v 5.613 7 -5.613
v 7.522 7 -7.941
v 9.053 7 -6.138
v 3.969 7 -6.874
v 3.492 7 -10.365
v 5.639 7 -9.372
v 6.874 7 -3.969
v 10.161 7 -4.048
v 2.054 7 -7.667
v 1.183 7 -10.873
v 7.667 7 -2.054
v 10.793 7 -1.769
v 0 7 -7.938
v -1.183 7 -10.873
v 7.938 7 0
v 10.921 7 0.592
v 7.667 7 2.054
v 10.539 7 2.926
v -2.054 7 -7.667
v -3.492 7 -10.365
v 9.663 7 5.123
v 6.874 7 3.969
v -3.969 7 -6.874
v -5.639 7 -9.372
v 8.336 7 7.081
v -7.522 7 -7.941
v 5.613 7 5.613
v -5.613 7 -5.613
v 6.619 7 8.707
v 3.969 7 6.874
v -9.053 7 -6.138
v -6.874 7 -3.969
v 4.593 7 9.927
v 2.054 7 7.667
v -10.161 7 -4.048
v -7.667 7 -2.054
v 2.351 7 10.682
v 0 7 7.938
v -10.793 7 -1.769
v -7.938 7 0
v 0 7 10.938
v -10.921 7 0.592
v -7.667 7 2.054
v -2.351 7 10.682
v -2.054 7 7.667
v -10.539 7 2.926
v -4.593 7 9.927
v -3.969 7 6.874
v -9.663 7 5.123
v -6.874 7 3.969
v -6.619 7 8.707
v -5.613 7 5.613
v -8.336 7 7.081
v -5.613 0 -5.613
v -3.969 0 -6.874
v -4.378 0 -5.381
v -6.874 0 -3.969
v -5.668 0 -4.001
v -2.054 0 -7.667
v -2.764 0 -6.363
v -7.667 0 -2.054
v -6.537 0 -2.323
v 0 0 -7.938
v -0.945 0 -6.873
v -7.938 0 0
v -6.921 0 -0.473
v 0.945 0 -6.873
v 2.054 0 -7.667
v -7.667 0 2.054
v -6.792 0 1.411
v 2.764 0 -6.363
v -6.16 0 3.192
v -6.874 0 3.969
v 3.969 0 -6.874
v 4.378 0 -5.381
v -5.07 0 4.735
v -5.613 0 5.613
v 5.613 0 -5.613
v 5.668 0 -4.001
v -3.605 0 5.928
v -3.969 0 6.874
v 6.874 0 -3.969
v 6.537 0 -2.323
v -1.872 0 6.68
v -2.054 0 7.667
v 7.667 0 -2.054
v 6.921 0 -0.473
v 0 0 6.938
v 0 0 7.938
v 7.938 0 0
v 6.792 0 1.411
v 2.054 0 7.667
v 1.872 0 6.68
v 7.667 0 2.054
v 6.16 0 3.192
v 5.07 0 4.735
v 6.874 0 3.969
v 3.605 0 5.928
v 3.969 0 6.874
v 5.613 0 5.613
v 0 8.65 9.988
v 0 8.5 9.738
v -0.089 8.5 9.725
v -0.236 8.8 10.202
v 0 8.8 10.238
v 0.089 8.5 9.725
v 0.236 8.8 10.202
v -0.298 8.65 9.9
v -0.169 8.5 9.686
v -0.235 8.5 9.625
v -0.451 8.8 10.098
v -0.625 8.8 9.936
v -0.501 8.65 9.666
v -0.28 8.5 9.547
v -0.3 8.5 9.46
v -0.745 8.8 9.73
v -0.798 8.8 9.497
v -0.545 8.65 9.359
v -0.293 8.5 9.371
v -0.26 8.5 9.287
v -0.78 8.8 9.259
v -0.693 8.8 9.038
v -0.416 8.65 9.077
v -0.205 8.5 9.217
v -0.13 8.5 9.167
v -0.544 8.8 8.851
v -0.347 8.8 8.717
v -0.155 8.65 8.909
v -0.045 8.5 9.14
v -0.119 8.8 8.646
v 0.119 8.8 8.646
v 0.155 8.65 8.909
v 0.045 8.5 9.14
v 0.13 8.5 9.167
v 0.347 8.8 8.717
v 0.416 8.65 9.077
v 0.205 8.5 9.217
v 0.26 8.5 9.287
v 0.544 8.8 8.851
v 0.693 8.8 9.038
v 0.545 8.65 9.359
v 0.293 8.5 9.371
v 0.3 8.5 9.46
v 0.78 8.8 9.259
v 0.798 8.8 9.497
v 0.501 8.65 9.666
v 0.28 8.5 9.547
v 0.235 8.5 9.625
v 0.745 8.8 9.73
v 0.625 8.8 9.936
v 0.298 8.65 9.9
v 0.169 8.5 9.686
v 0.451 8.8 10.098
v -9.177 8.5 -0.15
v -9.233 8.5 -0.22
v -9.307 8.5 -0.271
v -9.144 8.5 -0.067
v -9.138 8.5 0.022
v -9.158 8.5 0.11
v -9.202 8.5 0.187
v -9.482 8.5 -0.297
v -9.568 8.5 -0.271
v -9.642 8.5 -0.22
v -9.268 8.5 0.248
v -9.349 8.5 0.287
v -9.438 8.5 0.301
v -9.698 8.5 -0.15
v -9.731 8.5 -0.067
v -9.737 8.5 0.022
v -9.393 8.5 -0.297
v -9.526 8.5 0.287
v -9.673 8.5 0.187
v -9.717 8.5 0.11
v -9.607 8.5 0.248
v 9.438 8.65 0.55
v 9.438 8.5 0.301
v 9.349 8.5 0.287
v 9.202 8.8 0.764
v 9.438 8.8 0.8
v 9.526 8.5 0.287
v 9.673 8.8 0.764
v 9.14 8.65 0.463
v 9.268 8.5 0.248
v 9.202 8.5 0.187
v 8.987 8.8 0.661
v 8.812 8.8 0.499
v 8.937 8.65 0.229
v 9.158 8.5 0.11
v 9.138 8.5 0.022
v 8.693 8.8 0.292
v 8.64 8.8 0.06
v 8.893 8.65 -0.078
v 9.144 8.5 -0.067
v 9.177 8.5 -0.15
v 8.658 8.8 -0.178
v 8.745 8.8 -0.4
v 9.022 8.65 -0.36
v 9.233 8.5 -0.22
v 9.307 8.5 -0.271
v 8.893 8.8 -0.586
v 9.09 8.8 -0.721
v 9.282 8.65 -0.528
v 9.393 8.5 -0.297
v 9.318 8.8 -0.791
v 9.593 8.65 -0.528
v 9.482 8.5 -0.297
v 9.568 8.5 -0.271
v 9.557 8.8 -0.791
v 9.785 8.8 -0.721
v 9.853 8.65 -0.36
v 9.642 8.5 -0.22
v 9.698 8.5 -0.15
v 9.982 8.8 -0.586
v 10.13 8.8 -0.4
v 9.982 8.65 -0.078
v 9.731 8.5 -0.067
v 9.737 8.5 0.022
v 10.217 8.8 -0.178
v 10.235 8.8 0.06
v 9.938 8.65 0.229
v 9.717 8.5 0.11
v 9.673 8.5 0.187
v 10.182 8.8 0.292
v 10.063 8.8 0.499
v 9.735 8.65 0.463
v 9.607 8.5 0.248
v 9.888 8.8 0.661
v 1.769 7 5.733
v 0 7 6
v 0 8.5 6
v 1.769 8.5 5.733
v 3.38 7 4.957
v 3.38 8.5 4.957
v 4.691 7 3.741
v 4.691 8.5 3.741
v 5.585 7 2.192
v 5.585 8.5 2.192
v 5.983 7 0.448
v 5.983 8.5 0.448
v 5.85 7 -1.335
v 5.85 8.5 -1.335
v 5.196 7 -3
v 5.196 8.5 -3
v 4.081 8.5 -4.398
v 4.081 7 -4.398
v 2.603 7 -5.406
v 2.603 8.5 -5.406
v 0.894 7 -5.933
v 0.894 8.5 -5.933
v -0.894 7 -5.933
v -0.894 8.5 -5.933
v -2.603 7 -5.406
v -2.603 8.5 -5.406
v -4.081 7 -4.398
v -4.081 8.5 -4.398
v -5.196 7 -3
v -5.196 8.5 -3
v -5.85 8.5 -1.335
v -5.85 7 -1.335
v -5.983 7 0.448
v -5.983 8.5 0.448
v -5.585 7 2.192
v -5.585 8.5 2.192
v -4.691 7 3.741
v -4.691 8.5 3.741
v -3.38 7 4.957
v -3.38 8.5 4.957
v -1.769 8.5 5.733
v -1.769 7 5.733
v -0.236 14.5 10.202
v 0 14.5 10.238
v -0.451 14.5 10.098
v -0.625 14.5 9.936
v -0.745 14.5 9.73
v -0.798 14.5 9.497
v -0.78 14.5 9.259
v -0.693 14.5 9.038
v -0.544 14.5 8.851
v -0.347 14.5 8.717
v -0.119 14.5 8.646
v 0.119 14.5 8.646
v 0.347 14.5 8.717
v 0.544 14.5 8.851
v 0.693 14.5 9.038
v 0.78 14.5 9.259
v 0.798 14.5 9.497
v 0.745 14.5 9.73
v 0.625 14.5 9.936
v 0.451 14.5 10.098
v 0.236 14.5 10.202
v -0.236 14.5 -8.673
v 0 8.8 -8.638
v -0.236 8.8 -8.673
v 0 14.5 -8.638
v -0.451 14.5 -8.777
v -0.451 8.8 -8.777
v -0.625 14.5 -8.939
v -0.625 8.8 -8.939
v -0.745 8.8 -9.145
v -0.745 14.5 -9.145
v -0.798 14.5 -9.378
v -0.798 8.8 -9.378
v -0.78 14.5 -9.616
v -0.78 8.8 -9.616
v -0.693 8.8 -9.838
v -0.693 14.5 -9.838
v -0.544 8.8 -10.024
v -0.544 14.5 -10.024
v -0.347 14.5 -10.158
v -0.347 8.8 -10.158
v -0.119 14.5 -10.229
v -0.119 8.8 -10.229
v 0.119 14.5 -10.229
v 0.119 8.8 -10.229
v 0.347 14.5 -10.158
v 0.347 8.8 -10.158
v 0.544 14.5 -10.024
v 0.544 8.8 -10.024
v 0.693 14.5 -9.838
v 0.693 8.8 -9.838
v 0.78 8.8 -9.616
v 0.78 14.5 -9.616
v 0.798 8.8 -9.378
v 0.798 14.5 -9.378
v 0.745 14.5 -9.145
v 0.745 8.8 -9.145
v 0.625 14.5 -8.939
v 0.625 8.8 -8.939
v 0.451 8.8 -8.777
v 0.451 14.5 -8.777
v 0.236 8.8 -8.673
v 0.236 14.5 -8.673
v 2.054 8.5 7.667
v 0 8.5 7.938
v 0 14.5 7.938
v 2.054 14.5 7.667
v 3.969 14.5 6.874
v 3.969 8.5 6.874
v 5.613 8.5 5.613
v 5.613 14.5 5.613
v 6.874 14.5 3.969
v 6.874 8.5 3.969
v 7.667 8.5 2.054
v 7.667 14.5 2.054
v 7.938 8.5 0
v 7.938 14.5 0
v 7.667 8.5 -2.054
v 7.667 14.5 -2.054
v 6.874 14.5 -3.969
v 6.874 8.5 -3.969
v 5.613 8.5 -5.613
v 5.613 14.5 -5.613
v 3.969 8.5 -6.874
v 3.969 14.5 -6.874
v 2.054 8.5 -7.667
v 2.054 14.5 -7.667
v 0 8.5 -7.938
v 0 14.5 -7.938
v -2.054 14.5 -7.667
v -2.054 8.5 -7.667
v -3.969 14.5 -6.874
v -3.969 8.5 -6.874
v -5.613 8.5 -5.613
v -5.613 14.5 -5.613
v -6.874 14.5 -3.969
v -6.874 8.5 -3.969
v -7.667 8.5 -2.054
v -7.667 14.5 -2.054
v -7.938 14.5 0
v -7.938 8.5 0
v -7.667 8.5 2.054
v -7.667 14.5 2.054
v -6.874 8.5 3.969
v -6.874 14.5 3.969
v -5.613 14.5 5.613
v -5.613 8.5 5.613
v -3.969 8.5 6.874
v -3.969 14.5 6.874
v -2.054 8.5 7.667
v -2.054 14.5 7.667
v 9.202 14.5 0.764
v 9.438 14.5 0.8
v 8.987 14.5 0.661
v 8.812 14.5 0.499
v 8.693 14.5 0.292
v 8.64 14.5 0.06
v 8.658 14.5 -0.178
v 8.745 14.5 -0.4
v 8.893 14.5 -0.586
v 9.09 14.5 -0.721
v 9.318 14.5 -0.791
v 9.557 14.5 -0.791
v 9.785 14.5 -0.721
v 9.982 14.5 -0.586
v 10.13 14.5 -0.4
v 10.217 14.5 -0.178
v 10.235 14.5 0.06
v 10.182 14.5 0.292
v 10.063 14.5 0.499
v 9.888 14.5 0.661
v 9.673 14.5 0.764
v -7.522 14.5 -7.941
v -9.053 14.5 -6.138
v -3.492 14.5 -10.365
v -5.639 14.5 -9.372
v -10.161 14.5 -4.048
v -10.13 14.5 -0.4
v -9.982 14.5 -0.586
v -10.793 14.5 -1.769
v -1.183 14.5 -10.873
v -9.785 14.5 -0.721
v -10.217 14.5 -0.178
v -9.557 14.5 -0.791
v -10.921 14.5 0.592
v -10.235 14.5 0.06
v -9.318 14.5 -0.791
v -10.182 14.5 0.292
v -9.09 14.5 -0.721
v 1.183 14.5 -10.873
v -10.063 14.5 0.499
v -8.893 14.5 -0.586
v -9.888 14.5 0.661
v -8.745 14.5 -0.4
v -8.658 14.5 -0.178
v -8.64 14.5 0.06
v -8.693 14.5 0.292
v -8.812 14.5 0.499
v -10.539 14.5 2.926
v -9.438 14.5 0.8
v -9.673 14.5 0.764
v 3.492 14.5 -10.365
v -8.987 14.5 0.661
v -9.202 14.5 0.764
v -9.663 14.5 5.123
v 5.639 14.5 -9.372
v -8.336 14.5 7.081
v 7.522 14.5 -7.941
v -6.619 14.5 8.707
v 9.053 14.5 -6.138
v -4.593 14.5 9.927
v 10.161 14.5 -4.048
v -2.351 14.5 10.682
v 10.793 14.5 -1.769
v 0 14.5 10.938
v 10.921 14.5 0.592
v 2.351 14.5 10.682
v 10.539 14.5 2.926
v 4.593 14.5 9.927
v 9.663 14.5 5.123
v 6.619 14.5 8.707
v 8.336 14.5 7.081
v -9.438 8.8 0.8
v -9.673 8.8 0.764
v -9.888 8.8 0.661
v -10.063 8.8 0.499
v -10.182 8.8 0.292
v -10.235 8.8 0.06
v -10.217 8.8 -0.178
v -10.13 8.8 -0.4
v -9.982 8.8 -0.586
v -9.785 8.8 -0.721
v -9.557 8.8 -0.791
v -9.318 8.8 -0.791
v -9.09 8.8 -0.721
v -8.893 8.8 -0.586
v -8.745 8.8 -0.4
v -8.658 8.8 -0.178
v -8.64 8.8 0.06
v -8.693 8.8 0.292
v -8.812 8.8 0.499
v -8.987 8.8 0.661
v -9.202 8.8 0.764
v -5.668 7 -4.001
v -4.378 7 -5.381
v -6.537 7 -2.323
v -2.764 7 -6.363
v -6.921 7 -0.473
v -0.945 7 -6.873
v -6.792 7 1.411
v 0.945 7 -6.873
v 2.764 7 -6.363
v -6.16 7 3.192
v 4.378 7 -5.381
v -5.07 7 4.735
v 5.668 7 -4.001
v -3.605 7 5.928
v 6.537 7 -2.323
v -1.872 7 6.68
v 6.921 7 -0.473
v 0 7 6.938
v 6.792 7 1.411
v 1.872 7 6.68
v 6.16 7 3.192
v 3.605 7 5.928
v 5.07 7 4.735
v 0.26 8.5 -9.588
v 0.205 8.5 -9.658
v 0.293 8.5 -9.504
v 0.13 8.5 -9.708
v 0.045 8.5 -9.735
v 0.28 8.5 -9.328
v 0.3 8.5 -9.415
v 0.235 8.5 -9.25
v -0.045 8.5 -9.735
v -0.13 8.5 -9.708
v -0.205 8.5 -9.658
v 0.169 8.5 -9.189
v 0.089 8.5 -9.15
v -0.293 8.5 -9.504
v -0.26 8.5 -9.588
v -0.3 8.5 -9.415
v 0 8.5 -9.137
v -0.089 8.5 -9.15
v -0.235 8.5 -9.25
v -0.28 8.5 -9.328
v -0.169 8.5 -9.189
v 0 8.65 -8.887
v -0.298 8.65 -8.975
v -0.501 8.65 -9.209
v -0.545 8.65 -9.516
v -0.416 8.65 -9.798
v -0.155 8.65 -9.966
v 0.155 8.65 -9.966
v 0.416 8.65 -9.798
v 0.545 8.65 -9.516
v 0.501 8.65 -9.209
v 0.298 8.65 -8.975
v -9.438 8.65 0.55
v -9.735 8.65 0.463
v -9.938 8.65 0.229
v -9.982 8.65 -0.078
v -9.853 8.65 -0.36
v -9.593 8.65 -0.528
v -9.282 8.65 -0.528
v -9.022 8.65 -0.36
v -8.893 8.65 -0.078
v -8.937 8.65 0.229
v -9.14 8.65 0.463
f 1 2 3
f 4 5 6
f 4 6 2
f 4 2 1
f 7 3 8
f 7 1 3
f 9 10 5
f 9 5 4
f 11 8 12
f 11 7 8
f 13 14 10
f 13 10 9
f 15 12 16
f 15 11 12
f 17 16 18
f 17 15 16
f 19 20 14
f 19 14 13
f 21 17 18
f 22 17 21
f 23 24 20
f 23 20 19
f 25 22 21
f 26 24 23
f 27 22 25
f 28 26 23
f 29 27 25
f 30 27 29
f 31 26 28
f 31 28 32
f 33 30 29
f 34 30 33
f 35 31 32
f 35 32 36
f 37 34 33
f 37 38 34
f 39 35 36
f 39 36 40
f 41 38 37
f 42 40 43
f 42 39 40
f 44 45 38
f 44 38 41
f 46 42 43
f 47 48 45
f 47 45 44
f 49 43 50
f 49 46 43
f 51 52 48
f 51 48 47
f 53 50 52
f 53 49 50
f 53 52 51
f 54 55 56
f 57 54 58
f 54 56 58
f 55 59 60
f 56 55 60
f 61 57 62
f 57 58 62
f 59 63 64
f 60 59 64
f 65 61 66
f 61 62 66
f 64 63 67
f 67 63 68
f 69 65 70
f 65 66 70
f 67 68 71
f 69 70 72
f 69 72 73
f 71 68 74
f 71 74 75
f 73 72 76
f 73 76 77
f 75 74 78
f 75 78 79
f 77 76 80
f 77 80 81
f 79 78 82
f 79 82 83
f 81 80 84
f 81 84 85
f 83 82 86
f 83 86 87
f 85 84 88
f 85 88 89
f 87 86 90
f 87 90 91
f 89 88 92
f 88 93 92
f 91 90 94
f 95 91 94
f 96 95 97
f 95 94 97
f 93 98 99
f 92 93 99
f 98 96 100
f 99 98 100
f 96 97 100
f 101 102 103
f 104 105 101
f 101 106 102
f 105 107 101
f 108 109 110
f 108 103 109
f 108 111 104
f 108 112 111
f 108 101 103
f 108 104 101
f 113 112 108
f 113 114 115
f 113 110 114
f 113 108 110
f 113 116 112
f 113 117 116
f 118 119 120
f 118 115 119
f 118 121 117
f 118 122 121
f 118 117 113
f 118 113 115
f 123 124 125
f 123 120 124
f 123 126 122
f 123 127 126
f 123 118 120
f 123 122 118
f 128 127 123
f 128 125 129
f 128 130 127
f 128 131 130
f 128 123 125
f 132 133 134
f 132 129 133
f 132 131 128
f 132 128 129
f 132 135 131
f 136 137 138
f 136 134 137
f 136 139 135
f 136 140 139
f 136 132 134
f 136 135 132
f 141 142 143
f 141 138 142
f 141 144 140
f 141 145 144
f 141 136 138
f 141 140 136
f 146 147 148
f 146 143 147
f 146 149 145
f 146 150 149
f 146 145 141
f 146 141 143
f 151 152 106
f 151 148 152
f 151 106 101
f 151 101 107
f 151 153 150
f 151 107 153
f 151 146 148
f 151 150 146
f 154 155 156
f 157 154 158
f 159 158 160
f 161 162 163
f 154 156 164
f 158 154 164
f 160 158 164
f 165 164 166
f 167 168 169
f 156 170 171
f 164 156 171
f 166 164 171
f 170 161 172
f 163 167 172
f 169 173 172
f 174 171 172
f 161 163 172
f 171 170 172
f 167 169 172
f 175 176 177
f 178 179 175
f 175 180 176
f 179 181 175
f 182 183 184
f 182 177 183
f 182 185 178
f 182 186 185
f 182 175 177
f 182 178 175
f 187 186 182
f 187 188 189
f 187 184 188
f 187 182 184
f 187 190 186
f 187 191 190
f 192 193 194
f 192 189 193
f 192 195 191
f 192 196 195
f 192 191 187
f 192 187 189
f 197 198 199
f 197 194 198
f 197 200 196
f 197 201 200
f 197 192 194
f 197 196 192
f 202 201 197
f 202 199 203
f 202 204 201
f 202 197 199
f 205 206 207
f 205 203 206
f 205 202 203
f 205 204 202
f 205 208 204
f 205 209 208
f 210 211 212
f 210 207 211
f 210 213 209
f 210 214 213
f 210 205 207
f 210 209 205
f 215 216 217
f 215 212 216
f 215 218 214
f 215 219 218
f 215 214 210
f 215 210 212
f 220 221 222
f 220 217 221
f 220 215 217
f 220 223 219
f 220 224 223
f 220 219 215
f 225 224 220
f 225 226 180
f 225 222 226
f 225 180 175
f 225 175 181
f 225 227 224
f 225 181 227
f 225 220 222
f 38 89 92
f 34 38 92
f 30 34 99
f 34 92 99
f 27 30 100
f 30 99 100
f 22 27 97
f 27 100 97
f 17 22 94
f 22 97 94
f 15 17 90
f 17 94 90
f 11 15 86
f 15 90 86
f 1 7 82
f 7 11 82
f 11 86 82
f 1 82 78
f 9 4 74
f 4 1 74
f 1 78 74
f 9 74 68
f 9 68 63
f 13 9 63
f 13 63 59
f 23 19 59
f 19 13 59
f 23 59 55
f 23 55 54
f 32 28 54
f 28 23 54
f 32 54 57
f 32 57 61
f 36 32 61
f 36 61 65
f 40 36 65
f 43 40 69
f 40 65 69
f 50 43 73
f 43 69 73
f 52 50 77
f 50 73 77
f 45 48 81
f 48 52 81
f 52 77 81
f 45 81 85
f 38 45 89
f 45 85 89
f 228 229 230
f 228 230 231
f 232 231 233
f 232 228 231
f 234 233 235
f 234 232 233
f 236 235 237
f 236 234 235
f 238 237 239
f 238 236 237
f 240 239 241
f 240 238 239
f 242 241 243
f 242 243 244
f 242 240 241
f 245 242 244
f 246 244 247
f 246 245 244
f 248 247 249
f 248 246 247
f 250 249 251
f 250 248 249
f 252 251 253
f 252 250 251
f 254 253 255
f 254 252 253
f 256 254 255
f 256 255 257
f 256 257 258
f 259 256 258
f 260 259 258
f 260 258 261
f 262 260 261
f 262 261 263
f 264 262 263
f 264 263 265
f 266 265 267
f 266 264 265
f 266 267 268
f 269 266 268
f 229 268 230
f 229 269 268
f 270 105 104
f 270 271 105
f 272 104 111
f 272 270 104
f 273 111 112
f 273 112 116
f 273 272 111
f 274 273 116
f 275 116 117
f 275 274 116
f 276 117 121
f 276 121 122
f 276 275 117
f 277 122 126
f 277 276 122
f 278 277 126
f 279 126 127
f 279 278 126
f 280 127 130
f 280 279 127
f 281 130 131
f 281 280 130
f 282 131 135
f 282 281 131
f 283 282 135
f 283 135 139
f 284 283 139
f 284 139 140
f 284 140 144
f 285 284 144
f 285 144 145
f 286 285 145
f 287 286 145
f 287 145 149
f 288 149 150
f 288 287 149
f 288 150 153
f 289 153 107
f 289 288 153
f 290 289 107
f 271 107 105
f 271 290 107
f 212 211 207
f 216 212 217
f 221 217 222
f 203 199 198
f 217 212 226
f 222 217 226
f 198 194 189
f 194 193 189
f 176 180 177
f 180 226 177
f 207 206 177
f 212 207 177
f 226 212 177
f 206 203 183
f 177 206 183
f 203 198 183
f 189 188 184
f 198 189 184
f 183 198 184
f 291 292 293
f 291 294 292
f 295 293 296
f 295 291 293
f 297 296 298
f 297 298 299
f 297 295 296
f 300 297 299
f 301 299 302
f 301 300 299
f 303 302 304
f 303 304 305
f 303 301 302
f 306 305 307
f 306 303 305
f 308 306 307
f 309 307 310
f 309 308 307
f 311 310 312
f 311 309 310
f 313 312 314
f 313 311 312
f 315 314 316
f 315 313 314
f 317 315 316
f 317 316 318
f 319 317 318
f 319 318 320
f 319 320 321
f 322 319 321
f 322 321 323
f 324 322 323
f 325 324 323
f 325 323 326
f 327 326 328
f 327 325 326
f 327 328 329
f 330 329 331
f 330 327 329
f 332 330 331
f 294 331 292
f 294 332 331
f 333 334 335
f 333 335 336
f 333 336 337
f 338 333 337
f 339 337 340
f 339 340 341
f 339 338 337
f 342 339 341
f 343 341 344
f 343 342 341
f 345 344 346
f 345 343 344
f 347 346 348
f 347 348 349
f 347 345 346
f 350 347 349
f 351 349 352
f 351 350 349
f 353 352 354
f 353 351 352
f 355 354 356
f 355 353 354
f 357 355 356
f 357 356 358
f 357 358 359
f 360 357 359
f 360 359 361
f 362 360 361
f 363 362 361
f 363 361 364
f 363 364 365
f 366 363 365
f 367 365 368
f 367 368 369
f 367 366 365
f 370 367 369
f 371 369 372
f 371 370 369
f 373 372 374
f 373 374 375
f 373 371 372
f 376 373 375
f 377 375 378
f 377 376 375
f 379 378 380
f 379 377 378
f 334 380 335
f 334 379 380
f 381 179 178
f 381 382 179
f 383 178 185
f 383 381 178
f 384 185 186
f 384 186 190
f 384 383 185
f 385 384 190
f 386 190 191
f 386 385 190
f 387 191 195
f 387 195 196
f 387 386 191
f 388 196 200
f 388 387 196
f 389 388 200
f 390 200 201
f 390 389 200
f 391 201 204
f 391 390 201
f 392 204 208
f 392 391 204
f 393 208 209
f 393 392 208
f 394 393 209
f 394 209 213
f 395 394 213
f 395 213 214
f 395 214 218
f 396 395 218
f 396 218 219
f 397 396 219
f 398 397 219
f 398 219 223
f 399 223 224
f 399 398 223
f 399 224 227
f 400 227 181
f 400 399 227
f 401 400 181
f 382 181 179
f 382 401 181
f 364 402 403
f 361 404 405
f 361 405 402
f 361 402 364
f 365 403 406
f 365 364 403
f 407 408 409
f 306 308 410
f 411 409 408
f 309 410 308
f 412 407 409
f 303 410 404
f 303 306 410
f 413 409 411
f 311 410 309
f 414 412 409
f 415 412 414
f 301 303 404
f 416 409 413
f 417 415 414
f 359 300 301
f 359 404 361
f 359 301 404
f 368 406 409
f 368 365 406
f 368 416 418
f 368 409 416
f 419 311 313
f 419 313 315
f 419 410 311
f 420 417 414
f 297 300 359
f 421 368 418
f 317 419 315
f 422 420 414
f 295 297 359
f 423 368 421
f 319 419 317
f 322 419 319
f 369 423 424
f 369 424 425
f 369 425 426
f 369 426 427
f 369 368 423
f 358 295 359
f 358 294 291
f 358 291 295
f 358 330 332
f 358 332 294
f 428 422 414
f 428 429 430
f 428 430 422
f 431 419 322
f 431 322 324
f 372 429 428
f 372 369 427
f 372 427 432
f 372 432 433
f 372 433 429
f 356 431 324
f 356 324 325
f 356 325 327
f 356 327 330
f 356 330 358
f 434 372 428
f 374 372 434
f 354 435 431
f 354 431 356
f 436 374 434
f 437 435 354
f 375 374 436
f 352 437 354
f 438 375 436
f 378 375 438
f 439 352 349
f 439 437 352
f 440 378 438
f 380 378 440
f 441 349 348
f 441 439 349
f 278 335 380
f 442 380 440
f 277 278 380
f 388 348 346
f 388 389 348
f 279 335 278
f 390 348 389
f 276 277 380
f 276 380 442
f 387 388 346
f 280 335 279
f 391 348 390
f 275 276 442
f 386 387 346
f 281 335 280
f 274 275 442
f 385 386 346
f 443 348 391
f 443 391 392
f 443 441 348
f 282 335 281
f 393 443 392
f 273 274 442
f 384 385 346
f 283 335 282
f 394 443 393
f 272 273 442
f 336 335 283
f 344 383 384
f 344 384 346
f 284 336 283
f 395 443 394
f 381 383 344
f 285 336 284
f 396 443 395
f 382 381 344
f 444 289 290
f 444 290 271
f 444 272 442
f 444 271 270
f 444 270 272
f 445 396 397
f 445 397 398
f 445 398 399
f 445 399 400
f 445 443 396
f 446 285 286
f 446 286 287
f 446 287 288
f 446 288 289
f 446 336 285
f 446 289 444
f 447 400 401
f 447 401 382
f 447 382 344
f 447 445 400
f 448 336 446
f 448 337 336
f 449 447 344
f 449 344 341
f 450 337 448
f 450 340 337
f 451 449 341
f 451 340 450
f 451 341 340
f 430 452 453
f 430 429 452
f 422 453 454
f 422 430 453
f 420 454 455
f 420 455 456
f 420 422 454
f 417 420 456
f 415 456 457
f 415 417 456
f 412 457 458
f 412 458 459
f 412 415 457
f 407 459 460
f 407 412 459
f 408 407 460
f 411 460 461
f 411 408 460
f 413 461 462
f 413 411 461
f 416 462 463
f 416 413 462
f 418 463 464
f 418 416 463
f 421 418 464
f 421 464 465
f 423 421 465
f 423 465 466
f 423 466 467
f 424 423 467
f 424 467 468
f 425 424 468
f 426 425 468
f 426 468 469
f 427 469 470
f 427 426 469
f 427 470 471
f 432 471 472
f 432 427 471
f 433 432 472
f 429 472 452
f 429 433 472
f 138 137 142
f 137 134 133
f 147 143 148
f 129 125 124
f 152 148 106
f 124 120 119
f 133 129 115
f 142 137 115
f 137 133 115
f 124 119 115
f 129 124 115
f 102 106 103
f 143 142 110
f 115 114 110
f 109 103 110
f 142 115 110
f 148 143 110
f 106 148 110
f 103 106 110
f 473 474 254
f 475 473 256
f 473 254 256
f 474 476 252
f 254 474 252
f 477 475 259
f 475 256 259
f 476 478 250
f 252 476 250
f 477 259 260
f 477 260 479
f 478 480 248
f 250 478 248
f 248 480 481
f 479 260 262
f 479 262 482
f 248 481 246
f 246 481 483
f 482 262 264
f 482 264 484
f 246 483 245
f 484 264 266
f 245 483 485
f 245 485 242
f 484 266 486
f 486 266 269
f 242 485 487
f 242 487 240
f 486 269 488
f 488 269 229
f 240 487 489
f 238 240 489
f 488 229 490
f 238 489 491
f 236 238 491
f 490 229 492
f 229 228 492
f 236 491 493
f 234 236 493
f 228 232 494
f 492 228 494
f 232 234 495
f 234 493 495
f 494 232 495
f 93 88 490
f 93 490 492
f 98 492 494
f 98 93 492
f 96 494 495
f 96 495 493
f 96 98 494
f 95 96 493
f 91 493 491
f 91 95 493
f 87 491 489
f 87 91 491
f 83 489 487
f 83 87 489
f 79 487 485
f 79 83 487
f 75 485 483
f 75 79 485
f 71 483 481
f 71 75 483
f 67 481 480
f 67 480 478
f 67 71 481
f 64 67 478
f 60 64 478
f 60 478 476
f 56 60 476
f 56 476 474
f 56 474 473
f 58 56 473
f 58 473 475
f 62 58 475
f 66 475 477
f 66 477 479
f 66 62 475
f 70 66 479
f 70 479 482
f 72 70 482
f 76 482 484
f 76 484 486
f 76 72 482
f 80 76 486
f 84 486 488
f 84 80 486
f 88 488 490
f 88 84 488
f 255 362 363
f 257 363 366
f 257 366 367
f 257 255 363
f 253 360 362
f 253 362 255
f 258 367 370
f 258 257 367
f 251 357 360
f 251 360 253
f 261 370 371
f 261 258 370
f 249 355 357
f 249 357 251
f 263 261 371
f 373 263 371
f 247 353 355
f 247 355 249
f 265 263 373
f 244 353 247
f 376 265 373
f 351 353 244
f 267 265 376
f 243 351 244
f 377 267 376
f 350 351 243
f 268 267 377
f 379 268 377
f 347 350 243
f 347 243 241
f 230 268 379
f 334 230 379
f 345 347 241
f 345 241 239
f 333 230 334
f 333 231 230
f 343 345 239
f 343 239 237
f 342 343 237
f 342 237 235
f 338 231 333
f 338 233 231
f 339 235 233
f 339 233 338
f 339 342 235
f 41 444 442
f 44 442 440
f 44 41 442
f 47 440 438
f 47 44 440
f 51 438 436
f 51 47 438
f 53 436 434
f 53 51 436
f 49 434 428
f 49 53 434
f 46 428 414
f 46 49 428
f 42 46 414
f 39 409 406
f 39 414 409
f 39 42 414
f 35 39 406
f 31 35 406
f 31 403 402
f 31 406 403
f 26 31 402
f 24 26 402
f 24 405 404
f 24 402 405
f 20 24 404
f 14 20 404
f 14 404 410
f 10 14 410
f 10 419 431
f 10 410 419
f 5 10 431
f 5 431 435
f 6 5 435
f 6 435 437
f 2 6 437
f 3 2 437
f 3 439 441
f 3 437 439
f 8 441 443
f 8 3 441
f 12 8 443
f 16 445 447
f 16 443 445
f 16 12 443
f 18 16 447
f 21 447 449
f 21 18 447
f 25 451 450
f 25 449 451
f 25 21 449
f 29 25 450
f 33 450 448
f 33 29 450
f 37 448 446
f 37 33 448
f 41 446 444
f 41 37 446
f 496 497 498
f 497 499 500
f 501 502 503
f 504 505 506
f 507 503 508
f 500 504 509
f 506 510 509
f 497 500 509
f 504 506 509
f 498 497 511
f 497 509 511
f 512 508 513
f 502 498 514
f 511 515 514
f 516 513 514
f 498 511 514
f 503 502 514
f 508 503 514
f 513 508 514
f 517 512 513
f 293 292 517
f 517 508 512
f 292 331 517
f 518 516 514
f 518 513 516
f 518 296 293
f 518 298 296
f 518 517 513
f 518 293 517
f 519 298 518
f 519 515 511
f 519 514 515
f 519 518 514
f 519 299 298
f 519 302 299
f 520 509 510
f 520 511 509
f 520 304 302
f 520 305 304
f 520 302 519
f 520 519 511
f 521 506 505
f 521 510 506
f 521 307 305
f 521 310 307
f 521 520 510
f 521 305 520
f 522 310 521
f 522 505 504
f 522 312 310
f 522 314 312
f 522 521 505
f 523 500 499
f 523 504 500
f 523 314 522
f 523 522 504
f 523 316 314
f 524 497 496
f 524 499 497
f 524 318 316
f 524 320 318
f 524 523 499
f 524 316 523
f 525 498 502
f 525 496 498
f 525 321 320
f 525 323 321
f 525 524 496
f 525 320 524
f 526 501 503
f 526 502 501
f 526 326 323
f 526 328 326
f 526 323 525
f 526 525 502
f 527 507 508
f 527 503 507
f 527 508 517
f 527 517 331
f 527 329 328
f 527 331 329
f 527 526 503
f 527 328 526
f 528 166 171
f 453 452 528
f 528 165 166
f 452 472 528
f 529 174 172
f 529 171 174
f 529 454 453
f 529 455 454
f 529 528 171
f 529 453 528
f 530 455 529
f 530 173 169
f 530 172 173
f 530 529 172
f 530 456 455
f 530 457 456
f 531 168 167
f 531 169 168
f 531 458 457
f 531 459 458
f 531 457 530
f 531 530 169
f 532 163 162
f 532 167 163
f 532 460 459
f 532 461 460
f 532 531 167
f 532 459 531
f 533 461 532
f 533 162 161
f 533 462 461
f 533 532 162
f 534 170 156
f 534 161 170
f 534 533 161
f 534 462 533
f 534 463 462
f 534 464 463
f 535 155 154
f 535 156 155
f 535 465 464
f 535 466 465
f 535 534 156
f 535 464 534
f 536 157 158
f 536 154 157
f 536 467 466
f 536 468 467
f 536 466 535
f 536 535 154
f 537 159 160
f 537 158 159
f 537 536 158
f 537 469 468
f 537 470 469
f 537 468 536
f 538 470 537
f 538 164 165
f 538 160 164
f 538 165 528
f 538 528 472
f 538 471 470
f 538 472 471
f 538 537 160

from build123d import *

# Parameters (mm, degrees)
SKETCH1_R                      = 7.9375
SKETCH1_R_2                    = 6.9375
BOSS_EXTRUDE1_DEPTH            = 7
SKETCH2_R                      = 7.9375
SKETCH2_R_2                    = 6
BOSS_EXTRUDE2_DEPTH            = 1.5
SKETCH3_R                      = 10.9375
SKETCH3_R_2                    = 7.9375
BOSS_EXTRUDE3_DEPTH            = 6
M2X0_4_TAPPED_HOLE1_AT_2_COUNT = 2
M2X0_4_TAPPED_HOLE1_AT_2_PITCH = 13.346640495
M2X0_4_TAPPED_HOLE1_AT_3_COUNT = 2
M2X0_4_TAPPED_HOLE1_AT_3_PITCH = 18.875
M2X0_4_TAPPED_HOLE1_AT_4_COUNT = 2
M2X0_4_TAPPED_HOLE1_AT_4_PITCH = 13.346640495
BOSS_EXTRUDE4_START            = 1.5
SKETCH7_R                      = 10.9375
SKETCH7_R_2                    = 6.9375
BOSS_EXTRUDE4_DEPTH            = 1.5


with BuildPart() as part:
    # Sketch1 → Boss-Extrude1 (new body)
    with BuildSketch(Plane(origin=(0, 0, 0), x_dir=(1, 0, 0), z_dir=(0, 1, 0))):
        with Locations(Location((0, 0, 0), (0, 0, 270))):
            Circle(SKETCH1_R)
        with Locations(Location((0, 0, 0), (0, 0, 270))):
            Circle(SKETCH1_R_2, mode=Mode.SUBTRACT)
    extrude(amount=BOSS_EXTRUDE1_DEPTH)

    # Sketch2 → Boss-Extrude2 (add)
    with BuildSketch(Plane(origin=(0, 7, 0), x_dir=(1, 0, 0), z_dir=(0, 1, 0))):
        with Locations(Location((0, 0, 0), (0, 0, 270))):
            Circle(SKETCH2_R)
        with Locations(Location((0, 0, 0), (0, 0, 270))):
            Circle(SKETCH2_R_2, mode=Mode.SUBTRACT)
    extrude(amount=BOSS_EXTRUDE2_DEPTH)



with BuildPart() as body_2:
    # Sketch3 → Boss-Extrude3 (new body)
    with BuildSketch(Plane(origin=(0, 8.5, 0), x_dir=(1, 0, 0), z_dir=(0, 1, 0))):
        with Locations(Location((0, 0, 0), (0, 0, 270))):
            Circle(SKETCH3_R)
        with Locations(Location((0, 0, 0), (0, 0, 270))):
            Circle(SKETCH3_R_2, mode=Mode.SUBTRACT)
    extrude(amount=BOSS_EXTRUDE3_DEPTH)

    # Sketch5 → M2x0.4 Tapped Hole1 (revolve, cut)
    with BuildSketch(Plane(origin=(0, 14.5, -9.4375), x_dir=(0, 0, 1), z_dir=(1, 0, 0))):
        Polygon((0, 0), (0, 6.180688495), (0.8, 5.7), (0.8, 0), align=None)
    m2x0_4_tapped_hole1 = revolve(axis=Axis((0, 20.85, -9.4375), (0, -1, 0)), mode=Mode.SUBTRACT)

    # M2x0.4 Tapped Hole1 at 2: M2x0.4 Tapped Hole1 ×2
    with Locations(*[Vector(0.7071067811865476, 0, 0.7071067811865476) * (i * M2X0_4_TAPPED_HOLE1_AT_2_PITCH) for i in range(1, M2X0_4_TAPPED_HOLE1_AT_2_COUNT)]):
        add(m2x0_4_tapped_hole1, mode=Mode.SUBTRACT)

    # M2x0.4 Tapped Hole1 at 3: M2x0.4 Tapped Hole1 ×2
    with Locations(*[(0, 0, i * M2X0_4_TAPPED_HOLE1_AT_3_PITCH) for i in range(1, M2X0_4_TAPPED_HOLE1_AT_3_COUNT)]):
        add(m2x0_4_tapped_hole1, mode=Mode.SUBTRACT)

    # M2x0.4 Tapped Hole1 at 4: M2x0.4 Tapped Hole1 ×2
    with Locations(*[Vector(-0.7071067811865476, 0, 0.7071067811865476) * (i * M2X0_4_TAPPED_HOLE1_AT_4_PITCH) for i in range(1, M2X0_4_TAPPED_HOLE1_AT_4_COUNT)]):
        add(m2x0_4_tapped_hole1, mode=Mode.SUBTRACT)


with BuildPart() as part_1:
    add(part.part)

    add(body_2.part)  # Boss-Extrude4 merges body 2
    # Sketch7 → Boss-Extrude4 (add)
    with BuildSketch(Plane.XZ.offset(-8.5).offset(BOSS_EXTRUDE4_START)):
        with Locations(Location((0, 0, 0), (0, 0, 90))):
            Circle(SKETCH7_R)
        with Locations(Location((0, 0, 0), (0, 0, 90))):
            Circle(SKETCH7_R_2, mode=Mode.SUBTRACT)
    extrude(amount=-BOSS_EXTRUDE4_DEPTH)


solid = part_1.part
